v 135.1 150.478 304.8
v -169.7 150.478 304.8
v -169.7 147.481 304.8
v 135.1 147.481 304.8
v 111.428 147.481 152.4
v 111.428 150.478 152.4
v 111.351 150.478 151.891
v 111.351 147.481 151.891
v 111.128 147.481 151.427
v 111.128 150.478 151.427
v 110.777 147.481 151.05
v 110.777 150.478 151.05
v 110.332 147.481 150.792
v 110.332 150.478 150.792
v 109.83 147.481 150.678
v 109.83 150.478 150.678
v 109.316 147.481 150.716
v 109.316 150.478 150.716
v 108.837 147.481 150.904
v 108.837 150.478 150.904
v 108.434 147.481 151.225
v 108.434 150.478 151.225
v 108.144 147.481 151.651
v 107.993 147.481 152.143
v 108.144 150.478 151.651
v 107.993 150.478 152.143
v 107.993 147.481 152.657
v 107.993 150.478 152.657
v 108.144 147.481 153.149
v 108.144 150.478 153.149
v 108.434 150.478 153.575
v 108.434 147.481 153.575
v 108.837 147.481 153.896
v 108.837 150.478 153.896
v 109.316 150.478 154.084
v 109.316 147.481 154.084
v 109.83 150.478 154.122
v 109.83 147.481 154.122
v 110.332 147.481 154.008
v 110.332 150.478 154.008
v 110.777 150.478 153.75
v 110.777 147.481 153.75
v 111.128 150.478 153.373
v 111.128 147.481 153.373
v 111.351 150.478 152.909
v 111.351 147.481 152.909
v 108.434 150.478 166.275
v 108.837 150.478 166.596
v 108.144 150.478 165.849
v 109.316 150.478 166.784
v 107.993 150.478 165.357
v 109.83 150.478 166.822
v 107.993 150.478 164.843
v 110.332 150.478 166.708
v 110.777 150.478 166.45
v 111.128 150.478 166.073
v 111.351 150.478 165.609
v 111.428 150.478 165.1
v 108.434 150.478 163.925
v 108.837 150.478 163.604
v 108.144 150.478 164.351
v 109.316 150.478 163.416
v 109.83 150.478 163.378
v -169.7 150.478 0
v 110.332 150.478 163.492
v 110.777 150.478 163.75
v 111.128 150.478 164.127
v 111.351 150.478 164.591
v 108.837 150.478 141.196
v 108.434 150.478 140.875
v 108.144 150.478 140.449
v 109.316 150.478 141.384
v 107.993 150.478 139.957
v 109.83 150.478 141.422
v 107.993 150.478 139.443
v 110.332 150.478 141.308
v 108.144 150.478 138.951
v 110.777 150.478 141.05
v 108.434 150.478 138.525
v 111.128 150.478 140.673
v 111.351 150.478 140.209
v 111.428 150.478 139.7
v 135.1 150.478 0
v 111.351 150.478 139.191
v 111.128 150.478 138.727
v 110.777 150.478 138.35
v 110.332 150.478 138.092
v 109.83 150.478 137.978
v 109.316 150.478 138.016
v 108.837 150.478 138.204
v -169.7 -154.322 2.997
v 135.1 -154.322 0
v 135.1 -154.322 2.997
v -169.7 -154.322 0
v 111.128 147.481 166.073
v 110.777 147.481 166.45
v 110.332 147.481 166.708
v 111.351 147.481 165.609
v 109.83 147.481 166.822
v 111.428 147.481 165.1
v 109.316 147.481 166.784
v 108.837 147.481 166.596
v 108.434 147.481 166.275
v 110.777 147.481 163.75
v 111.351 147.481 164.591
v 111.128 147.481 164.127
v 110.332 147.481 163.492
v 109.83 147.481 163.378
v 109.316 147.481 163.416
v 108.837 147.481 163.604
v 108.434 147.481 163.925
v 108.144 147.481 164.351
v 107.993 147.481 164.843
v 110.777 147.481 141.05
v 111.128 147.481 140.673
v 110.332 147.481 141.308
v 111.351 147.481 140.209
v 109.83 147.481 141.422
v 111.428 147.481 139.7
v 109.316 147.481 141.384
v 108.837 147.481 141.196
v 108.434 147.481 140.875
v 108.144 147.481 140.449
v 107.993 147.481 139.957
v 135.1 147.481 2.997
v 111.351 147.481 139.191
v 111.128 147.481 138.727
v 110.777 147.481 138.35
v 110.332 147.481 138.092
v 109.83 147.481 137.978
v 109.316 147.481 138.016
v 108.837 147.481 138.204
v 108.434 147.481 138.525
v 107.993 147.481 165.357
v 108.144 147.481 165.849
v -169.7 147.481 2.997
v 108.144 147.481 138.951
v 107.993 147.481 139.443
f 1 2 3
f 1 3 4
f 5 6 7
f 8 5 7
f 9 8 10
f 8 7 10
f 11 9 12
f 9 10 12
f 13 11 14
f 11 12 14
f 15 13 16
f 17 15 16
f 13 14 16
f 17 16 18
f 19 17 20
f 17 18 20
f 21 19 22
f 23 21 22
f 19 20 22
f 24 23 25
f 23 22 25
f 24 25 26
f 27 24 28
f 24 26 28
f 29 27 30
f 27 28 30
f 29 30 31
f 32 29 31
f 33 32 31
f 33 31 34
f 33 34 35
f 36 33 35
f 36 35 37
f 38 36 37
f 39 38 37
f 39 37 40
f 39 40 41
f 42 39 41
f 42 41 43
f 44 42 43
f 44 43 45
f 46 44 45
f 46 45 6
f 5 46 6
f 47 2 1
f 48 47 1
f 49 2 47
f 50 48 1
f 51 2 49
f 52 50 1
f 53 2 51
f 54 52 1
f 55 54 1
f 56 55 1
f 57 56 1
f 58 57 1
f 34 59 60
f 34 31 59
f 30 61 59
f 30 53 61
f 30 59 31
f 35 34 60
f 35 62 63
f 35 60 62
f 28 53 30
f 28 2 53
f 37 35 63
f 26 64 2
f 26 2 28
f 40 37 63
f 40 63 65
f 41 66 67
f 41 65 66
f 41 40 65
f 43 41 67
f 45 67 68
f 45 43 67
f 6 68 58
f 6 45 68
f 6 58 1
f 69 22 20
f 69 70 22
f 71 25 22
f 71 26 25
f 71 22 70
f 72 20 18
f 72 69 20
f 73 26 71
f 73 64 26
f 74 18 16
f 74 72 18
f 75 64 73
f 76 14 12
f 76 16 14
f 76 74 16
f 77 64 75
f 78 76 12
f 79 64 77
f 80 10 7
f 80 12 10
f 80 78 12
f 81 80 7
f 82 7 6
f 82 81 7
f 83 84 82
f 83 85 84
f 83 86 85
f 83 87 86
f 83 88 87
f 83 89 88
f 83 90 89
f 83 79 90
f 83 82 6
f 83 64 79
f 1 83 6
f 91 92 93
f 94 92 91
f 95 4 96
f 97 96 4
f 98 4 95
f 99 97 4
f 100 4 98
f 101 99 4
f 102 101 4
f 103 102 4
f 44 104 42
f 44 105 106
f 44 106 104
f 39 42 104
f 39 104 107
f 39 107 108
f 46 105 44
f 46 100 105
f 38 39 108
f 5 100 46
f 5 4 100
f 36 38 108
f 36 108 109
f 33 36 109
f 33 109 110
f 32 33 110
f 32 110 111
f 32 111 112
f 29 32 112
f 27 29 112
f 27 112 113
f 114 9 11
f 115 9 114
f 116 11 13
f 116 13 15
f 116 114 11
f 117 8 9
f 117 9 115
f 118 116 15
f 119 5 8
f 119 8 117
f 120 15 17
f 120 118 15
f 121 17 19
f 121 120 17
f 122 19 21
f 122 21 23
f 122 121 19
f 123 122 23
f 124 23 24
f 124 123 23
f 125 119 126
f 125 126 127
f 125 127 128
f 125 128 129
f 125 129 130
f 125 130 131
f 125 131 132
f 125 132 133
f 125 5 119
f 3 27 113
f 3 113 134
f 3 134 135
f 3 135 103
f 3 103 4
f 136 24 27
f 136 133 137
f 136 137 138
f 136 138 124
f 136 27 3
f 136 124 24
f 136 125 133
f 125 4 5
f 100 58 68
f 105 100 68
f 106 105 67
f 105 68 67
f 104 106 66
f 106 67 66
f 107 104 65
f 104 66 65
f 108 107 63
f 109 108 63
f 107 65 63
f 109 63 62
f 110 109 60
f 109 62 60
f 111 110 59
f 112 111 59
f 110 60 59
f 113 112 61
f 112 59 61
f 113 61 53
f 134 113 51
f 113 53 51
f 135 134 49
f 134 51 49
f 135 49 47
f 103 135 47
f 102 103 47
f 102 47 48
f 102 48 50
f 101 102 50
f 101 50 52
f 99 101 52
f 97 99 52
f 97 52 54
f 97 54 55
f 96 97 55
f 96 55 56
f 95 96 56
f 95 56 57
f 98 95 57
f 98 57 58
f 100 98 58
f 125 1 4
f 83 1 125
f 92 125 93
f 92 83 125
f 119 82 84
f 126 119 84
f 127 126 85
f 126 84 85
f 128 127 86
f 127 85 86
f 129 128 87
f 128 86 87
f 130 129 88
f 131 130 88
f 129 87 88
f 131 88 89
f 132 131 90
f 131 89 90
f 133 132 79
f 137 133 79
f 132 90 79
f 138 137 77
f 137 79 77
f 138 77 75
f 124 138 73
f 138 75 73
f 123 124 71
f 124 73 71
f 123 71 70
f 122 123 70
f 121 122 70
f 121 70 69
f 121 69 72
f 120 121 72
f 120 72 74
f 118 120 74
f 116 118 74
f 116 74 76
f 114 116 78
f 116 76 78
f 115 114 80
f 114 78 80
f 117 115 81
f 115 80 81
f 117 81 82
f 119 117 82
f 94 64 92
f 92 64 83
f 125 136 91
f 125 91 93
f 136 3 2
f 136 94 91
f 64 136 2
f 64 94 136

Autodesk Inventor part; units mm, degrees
ref_plane "YZ Plane" through (0, 0, 0) normal (1, 0, 0) x (0, 1, 0)
ref_plane "XZ Plane" through (0, 0, 0) normal (0, 1, 0) x (-1, 0, 0)
ref_plane "XY Plane" through (0, 0, 0) normal (0, 0, 1) x (1, 0, 0)
sketch "Sketch1" plane through (0, 0, 0) normal (0, 0, 1) x (1, 0, 0)
  line L0 (-169.6995, 150.4778) -> (135.1005, 150.4778)
  line L1 (135.1005, 150.4778) -> (135.1005, -154.3222)
  line L2 (135.1005, -154.3222) -> (-169.6995, -154.3222)
  line L3 (-169.6995, -154.3222) -> (-169.6995, 150.4778)
  point P0 (0, 0)
  dimension "d0" = 304.8
extrude "Extrusion1" add sketch "Sketch1" along normal blind 2.9972
sketch "Sketch2" plane through (0, 0, 2.9972) normal (0, 0, 1) x (1, 0, 0)
  line L0 (135.1005, 150.4778) -> (-169.6995, 150.4778) projected
  line L1 (135.1005, -154.3222) -> (135.1005, 150.4778) projected
  line L2 (-169.6995, 150.4778) -> (135.1005, 150.4778)
  line L3 (135.1005, 150.4778) -> (135.1005, 147.4806)
  line L4 (135.1005, 147.4806) -> (-169.6995, 147.4806)
  line L5 (-169.6995, 147.4806) -> (-169.6995, 150.4778)
  point P0 (0, 0)
  dimension "d3" = 2.9972
extrude "Extrusion2" add sketch "Sketch2" along normal blind 301.8028
sketch "Sketch3" plane through (-169.6995, 150.4778, 0) normal (0, 1, 0) x (1, 0, 0)
  circle A0 centre (279.4, -139.7) radius 1.7272
  circle A1 centre (279.4, -152.4) radius 1.7272
  circle A2 centre (279.4, -165.1) radius 1.7272
  line L0 (279.4, -137.0931) -> (279.4, -150.7928) construction
  line L1 (304.8, 0) -> (304.8, -304.8) projected
  line L2 (304.8, -304.8) -> (0, -304.8) projected
  point P0 (169.6995, 0)
  dimension "d6" = 3.4544
  dimension "d7" = 12.7
  dimension "d8" = 12.7
  dimension "d9" = 25.4
  dimension "d10" = 152.4
extrude "Extrusion3" cut sketch "Sketch3" against normal through all
properties part number "Frame Test for Papa John"
